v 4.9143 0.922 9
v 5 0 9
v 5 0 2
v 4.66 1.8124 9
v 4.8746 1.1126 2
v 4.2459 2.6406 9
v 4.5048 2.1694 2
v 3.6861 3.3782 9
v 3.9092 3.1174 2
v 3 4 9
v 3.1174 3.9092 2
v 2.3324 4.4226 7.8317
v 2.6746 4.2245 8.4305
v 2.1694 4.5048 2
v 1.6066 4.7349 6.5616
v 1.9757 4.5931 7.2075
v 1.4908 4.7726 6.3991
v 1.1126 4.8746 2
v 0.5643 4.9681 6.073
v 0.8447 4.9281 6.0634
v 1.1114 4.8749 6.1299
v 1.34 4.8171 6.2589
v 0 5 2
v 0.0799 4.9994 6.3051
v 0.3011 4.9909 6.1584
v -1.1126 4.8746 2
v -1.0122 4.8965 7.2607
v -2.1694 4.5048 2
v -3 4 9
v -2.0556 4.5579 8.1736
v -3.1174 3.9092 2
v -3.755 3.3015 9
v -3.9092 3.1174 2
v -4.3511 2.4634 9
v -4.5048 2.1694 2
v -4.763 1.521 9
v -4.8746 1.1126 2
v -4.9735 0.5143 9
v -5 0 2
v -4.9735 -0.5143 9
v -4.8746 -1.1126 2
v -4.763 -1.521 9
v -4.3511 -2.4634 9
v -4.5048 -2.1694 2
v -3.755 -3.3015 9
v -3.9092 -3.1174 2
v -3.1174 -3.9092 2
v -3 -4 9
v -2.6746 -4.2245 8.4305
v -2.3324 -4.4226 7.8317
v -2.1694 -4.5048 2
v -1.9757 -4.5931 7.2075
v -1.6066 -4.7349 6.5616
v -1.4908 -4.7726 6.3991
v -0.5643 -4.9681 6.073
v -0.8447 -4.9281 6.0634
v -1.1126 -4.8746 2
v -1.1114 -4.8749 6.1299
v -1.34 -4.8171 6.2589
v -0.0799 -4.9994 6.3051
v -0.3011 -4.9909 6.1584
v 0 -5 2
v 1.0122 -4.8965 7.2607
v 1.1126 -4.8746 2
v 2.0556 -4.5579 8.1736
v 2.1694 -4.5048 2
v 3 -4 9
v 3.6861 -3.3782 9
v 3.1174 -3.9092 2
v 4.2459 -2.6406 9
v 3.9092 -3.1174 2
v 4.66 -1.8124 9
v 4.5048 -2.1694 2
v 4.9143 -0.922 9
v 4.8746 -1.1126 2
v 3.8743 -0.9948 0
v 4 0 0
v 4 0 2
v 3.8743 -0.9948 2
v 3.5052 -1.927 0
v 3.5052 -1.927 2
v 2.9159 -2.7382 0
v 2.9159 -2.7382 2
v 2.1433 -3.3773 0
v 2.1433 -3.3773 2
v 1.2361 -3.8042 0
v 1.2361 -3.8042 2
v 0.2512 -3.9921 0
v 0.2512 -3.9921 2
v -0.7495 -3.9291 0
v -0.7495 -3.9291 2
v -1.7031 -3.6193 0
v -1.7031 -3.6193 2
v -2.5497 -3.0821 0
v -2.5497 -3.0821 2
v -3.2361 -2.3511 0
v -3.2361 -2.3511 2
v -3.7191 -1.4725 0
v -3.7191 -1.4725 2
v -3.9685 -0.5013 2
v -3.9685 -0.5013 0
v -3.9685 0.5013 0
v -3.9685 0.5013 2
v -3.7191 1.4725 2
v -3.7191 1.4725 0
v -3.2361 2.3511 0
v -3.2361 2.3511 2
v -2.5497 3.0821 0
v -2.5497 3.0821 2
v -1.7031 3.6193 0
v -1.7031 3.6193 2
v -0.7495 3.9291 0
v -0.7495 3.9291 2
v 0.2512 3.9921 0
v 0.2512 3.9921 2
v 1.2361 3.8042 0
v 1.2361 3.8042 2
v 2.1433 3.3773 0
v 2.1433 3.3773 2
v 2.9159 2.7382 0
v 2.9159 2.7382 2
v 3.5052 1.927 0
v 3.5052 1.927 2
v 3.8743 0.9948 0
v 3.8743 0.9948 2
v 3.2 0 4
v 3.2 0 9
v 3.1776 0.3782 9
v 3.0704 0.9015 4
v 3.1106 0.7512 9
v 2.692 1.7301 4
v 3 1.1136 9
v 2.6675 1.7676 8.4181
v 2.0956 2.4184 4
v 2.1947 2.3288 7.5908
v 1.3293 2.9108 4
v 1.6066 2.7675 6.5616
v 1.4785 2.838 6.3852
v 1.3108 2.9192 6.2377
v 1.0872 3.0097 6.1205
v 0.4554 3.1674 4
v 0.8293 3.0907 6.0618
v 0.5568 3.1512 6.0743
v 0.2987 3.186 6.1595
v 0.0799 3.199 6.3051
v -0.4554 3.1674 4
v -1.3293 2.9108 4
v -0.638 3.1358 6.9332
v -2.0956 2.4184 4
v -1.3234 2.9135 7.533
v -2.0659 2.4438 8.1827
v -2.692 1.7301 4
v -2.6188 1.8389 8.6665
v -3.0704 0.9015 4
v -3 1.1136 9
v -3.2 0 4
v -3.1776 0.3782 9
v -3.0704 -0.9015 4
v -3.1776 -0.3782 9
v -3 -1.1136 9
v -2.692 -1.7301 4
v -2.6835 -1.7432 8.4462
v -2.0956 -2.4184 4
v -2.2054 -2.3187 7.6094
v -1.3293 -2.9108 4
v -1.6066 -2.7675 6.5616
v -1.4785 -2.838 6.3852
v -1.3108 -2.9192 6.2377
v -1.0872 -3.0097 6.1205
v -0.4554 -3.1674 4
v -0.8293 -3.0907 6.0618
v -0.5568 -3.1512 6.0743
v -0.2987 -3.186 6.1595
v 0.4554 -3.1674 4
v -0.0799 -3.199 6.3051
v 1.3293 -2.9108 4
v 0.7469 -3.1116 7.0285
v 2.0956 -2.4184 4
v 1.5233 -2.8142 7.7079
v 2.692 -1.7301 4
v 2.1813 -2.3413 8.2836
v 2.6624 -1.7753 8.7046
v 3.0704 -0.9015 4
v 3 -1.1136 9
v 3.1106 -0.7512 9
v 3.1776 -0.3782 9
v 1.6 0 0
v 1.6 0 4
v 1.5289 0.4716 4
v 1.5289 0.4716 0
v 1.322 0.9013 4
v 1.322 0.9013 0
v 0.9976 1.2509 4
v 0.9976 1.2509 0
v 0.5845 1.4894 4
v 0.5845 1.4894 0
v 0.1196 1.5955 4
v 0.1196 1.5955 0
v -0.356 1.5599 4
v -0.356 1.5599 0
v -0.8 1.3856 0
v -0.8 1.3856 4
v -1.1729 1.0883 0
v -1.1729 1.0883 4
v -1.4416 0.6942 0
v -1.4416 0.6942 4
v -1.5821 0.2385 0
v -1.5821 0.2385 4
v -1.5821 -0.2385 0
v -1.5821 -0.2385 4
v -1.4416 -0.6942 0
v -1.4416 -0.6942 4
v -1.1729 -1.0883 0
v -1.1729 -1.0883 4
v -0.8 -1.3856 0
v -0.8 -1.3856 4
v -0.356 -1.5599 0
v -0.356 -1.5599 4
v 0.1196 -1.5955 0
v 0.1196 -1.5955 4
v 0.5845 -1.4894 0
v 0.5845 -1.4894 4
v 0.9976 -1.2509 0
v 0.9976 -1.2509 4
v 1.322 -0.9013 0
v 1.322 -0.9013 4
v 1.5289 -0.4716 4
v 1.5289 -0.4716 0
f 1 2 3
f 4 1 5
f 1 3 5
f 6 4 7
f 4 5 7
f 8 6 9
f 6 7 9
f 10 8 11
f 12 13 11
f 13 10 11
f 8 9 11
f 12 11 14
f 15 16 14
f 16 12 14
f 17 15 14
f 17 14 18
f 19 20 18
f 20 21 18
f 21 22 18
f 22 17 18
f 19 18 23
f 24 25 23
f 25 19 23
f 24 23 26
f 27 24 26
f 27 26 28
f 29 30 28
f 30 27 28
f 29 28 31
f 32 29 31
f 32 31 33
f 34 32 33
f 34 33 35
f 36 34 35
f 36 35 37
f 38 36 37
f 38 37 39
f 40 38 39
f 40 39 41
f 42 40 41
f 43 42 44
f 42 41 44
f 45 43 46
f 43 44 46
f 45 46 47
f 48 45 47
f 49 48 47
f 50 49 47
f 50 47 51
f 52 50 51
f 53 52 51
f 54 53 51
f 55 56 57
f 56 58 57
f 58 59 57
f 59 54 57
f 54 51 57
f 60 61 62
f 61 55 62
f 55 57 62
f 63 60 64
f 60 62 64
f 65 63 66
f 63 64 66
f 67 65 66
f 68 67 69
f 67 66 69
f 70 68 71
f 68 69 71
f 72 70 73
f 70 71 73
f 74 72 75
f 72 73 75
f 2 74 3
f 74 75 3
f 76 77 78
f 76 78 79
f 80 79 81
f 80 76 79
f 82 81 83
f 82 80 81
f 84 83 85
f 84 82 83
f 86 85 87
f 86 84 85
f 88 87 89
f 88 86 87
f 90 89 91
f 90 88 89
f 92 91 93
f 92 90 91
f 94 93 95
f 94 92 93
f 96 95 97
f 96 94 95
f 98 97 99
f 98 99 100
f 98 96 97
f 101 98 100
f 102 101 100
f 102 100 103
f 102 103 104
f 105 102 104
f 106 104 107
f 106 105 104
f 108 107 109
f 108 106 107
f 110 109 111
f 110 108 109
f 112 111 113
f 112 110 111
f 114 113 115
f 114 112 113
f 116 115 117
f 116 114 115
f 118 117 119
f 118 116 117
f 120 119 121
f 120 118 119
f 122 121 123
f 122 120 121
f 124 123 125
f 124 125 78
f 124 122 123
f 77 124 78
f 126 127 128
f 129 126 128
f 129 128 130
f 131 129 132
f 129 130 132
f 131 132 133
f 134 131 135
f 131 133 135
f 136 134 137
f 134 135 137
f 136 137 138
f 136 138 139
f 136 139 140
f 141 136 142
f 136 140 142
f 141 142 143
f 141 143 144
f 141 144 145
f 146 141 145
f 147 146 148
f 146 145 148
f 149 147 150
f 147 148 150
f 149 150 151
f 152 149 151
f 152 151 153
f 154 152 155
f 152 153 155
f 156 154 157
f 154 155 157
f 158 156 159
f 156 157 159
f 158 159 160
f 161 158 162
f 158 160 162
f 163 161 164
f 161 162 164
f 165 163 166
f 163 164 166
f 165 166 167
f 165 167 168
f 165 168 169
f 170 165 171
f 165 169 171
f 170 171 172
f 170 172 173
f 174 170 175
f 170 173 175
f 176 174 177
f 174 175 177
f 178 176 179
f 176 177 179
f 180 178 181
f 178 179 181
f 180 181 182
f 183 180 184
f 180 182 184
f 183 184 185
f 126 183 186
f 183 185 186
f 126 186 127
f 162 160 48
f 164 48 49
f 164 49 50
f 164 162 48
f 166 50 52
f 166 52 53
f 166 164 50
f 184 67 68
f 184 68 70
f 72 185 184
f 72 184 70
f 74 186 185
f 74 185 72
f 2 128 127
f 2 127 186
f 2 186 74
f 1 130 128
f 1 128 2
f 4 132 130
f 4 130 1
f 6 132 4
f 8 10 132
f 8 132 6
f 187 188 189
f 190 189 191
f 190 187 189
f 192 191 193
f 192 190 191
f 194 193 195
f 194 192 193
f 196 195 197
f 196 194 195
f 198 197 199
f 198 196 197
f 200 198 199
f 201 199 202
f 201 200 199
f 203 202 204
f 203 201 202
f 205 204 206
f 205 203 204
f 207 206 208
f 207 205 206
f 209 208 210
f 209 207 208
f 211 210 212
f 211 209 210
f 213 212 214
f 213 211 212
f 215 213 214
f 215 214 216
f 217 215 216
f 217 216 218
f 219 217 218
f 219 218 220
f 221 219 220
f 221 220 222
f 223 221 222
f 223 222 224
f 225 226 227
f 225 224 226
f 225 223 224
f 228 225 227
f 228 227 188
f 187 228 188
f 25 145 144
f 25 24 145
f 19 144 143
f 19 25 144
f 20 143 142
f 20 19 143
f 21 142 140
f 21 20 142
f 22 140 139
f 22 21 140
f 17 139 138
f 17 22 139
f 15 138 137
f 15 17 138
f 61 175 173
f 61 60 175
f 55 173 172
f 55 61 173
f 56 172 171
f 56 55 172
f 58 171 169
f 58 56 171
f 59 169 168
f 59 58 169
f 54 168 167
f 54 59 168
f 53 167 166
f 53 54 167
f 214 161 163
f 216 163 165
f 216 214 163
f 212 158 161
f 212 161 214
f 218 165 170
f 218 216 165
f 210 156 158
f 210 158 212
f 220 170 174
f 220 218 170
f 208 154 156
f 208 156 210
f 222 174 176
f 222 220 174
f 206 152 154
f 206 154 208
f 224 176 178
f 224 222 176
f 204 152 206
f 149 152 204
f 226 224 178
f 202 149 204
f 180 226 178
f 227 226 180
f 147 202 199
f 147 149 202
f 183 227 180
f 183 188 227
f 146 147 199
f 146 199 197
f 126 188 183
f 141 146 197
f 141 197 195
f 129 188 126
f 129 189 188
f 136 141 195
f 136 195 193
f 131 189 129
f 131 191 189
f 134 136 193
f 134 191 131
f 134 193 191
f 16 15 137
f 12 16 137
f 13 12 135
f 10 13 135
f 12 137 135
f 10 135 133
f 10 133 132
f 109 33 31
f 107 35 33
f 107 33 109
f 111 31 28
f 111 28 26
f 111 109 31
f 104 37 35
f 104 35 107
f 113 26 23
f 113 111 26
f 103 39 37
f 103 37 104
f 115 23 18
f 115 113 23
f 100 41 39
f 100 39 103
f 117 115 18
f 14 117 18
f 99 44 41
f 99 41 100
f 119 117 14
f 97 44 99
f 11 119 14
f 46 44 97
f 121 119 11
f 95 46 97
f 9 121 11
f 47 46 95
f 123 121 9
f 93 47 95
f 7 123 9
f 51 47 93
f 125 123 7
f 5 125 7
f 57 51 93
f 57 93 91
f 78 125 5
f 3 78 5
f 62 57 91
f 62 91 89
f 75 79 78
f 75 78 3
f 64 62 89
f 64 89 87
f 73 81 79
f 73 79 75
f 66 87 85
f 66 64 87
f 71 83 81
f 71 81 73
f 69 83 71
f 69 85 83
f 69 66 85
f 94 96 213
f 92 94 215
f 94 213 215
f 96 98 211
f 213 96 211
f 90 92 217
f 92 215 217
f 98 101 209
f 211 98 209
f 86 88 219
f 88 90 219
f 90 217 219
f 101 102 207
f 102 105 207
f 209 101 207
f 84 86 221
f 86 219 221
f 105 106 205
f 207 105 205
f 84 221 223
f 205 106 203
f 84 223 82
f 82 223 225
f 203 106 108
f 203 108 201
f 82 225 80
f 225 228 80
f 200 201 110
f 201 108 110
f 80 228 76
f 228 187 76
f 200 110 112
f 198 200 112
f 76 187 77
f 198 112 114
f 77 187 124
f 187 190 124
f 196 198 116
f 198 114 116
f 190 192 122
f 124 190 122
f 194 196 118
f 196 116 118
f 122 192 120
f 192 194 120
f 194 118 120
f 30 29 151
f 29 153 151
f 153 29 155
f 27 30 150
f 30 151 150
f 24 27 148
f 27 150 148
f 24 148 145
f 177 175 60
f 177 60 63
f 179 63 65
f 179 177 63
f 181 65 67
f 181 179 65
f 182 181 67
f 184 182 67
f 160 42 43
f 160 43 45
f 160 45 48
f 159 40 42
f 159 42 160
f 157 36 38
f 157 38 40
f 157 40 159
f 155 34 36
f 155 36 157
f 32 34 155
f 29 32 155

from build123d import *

# Parameters (mm, degrees)
PAD002_DEPTH    = 10
PAD001_DEPTH    = 12
SKETCH_R        = 5
SKETCH_R_2      = 1.6
PAD_DEPTH       = 9
SKETCH001_R     = 3.2
POCKET_DEPTH    = 5
SKETCH002_R     = 5
SKETCH002_R_2   = 4
POCKET001_DEPTH = 2
FILLET_R        = 1


with BuildPart() as pad002:
    # Sketch004 → Pad002 (new body)
    with BuildSketch(Plane.XZ):
        Polygon((-3, 9), (1, 5.5), (3, 9), align=None)
    extrude(amount=-PAD002_DEPTH)


with BuildPart() as pad001:
    # Sketch003 → Pad001 (new body)
    with BuildSketch(Plane.XZ):
        Polygon((-3, 9), (-1, 5.5), (3, 9), align=None)
    extrude(amount=PAD001_DEPTH)


with BuildPart() as fillet_body:
    # Sketch → Pad (new body)
    with BuildSketch(Plane.XY):
        Circle(SKETCH_R)
        Circle(SKETCH_R_2, mode=Mode.SUBTRACT)
    extrude(amount=PAD_DEPTH)

    # Sketch001 → Pocket (cut)
    with BuildSketch(Plane.XY.offset(9)):
        Circle(SKETCH001_R)
    extrude(amount=-POCKET_DEPTH, mode=Mode.SUBTRACT)

    # Sketch002 → Pocket001 (cut)
    with BuildSketch(Plane(origin=(0, 0, 0), x_dir=(1, 0, 0), z_dir=(0, 0, -1))):
        Circle(SKETCH002_R)
        Circle(SKETCH002_R_2, mode=Mode.SUBTRACT)
    extrude(amount=-POCKET001_DEPTH, mode=Mode.SUBTRACT)

    # Cut: cut Pad001
    add(pad001.part, mode=Mode.SUBTRACT)

    # Cut001: cut Pad002
    add(pad002.part, mode=Mode.SUBTRACT)

    # Fillet
    fillet_edges = [fillet_body.edges().sort_by_distance(p)[0] for p in [
        (1, 3.969358, 5.5),
        (-1, -3.969358, 5.5),
    ]]
    fillet(fillet_edges, radius=FILLET_R)


solid = fillet_body.part
